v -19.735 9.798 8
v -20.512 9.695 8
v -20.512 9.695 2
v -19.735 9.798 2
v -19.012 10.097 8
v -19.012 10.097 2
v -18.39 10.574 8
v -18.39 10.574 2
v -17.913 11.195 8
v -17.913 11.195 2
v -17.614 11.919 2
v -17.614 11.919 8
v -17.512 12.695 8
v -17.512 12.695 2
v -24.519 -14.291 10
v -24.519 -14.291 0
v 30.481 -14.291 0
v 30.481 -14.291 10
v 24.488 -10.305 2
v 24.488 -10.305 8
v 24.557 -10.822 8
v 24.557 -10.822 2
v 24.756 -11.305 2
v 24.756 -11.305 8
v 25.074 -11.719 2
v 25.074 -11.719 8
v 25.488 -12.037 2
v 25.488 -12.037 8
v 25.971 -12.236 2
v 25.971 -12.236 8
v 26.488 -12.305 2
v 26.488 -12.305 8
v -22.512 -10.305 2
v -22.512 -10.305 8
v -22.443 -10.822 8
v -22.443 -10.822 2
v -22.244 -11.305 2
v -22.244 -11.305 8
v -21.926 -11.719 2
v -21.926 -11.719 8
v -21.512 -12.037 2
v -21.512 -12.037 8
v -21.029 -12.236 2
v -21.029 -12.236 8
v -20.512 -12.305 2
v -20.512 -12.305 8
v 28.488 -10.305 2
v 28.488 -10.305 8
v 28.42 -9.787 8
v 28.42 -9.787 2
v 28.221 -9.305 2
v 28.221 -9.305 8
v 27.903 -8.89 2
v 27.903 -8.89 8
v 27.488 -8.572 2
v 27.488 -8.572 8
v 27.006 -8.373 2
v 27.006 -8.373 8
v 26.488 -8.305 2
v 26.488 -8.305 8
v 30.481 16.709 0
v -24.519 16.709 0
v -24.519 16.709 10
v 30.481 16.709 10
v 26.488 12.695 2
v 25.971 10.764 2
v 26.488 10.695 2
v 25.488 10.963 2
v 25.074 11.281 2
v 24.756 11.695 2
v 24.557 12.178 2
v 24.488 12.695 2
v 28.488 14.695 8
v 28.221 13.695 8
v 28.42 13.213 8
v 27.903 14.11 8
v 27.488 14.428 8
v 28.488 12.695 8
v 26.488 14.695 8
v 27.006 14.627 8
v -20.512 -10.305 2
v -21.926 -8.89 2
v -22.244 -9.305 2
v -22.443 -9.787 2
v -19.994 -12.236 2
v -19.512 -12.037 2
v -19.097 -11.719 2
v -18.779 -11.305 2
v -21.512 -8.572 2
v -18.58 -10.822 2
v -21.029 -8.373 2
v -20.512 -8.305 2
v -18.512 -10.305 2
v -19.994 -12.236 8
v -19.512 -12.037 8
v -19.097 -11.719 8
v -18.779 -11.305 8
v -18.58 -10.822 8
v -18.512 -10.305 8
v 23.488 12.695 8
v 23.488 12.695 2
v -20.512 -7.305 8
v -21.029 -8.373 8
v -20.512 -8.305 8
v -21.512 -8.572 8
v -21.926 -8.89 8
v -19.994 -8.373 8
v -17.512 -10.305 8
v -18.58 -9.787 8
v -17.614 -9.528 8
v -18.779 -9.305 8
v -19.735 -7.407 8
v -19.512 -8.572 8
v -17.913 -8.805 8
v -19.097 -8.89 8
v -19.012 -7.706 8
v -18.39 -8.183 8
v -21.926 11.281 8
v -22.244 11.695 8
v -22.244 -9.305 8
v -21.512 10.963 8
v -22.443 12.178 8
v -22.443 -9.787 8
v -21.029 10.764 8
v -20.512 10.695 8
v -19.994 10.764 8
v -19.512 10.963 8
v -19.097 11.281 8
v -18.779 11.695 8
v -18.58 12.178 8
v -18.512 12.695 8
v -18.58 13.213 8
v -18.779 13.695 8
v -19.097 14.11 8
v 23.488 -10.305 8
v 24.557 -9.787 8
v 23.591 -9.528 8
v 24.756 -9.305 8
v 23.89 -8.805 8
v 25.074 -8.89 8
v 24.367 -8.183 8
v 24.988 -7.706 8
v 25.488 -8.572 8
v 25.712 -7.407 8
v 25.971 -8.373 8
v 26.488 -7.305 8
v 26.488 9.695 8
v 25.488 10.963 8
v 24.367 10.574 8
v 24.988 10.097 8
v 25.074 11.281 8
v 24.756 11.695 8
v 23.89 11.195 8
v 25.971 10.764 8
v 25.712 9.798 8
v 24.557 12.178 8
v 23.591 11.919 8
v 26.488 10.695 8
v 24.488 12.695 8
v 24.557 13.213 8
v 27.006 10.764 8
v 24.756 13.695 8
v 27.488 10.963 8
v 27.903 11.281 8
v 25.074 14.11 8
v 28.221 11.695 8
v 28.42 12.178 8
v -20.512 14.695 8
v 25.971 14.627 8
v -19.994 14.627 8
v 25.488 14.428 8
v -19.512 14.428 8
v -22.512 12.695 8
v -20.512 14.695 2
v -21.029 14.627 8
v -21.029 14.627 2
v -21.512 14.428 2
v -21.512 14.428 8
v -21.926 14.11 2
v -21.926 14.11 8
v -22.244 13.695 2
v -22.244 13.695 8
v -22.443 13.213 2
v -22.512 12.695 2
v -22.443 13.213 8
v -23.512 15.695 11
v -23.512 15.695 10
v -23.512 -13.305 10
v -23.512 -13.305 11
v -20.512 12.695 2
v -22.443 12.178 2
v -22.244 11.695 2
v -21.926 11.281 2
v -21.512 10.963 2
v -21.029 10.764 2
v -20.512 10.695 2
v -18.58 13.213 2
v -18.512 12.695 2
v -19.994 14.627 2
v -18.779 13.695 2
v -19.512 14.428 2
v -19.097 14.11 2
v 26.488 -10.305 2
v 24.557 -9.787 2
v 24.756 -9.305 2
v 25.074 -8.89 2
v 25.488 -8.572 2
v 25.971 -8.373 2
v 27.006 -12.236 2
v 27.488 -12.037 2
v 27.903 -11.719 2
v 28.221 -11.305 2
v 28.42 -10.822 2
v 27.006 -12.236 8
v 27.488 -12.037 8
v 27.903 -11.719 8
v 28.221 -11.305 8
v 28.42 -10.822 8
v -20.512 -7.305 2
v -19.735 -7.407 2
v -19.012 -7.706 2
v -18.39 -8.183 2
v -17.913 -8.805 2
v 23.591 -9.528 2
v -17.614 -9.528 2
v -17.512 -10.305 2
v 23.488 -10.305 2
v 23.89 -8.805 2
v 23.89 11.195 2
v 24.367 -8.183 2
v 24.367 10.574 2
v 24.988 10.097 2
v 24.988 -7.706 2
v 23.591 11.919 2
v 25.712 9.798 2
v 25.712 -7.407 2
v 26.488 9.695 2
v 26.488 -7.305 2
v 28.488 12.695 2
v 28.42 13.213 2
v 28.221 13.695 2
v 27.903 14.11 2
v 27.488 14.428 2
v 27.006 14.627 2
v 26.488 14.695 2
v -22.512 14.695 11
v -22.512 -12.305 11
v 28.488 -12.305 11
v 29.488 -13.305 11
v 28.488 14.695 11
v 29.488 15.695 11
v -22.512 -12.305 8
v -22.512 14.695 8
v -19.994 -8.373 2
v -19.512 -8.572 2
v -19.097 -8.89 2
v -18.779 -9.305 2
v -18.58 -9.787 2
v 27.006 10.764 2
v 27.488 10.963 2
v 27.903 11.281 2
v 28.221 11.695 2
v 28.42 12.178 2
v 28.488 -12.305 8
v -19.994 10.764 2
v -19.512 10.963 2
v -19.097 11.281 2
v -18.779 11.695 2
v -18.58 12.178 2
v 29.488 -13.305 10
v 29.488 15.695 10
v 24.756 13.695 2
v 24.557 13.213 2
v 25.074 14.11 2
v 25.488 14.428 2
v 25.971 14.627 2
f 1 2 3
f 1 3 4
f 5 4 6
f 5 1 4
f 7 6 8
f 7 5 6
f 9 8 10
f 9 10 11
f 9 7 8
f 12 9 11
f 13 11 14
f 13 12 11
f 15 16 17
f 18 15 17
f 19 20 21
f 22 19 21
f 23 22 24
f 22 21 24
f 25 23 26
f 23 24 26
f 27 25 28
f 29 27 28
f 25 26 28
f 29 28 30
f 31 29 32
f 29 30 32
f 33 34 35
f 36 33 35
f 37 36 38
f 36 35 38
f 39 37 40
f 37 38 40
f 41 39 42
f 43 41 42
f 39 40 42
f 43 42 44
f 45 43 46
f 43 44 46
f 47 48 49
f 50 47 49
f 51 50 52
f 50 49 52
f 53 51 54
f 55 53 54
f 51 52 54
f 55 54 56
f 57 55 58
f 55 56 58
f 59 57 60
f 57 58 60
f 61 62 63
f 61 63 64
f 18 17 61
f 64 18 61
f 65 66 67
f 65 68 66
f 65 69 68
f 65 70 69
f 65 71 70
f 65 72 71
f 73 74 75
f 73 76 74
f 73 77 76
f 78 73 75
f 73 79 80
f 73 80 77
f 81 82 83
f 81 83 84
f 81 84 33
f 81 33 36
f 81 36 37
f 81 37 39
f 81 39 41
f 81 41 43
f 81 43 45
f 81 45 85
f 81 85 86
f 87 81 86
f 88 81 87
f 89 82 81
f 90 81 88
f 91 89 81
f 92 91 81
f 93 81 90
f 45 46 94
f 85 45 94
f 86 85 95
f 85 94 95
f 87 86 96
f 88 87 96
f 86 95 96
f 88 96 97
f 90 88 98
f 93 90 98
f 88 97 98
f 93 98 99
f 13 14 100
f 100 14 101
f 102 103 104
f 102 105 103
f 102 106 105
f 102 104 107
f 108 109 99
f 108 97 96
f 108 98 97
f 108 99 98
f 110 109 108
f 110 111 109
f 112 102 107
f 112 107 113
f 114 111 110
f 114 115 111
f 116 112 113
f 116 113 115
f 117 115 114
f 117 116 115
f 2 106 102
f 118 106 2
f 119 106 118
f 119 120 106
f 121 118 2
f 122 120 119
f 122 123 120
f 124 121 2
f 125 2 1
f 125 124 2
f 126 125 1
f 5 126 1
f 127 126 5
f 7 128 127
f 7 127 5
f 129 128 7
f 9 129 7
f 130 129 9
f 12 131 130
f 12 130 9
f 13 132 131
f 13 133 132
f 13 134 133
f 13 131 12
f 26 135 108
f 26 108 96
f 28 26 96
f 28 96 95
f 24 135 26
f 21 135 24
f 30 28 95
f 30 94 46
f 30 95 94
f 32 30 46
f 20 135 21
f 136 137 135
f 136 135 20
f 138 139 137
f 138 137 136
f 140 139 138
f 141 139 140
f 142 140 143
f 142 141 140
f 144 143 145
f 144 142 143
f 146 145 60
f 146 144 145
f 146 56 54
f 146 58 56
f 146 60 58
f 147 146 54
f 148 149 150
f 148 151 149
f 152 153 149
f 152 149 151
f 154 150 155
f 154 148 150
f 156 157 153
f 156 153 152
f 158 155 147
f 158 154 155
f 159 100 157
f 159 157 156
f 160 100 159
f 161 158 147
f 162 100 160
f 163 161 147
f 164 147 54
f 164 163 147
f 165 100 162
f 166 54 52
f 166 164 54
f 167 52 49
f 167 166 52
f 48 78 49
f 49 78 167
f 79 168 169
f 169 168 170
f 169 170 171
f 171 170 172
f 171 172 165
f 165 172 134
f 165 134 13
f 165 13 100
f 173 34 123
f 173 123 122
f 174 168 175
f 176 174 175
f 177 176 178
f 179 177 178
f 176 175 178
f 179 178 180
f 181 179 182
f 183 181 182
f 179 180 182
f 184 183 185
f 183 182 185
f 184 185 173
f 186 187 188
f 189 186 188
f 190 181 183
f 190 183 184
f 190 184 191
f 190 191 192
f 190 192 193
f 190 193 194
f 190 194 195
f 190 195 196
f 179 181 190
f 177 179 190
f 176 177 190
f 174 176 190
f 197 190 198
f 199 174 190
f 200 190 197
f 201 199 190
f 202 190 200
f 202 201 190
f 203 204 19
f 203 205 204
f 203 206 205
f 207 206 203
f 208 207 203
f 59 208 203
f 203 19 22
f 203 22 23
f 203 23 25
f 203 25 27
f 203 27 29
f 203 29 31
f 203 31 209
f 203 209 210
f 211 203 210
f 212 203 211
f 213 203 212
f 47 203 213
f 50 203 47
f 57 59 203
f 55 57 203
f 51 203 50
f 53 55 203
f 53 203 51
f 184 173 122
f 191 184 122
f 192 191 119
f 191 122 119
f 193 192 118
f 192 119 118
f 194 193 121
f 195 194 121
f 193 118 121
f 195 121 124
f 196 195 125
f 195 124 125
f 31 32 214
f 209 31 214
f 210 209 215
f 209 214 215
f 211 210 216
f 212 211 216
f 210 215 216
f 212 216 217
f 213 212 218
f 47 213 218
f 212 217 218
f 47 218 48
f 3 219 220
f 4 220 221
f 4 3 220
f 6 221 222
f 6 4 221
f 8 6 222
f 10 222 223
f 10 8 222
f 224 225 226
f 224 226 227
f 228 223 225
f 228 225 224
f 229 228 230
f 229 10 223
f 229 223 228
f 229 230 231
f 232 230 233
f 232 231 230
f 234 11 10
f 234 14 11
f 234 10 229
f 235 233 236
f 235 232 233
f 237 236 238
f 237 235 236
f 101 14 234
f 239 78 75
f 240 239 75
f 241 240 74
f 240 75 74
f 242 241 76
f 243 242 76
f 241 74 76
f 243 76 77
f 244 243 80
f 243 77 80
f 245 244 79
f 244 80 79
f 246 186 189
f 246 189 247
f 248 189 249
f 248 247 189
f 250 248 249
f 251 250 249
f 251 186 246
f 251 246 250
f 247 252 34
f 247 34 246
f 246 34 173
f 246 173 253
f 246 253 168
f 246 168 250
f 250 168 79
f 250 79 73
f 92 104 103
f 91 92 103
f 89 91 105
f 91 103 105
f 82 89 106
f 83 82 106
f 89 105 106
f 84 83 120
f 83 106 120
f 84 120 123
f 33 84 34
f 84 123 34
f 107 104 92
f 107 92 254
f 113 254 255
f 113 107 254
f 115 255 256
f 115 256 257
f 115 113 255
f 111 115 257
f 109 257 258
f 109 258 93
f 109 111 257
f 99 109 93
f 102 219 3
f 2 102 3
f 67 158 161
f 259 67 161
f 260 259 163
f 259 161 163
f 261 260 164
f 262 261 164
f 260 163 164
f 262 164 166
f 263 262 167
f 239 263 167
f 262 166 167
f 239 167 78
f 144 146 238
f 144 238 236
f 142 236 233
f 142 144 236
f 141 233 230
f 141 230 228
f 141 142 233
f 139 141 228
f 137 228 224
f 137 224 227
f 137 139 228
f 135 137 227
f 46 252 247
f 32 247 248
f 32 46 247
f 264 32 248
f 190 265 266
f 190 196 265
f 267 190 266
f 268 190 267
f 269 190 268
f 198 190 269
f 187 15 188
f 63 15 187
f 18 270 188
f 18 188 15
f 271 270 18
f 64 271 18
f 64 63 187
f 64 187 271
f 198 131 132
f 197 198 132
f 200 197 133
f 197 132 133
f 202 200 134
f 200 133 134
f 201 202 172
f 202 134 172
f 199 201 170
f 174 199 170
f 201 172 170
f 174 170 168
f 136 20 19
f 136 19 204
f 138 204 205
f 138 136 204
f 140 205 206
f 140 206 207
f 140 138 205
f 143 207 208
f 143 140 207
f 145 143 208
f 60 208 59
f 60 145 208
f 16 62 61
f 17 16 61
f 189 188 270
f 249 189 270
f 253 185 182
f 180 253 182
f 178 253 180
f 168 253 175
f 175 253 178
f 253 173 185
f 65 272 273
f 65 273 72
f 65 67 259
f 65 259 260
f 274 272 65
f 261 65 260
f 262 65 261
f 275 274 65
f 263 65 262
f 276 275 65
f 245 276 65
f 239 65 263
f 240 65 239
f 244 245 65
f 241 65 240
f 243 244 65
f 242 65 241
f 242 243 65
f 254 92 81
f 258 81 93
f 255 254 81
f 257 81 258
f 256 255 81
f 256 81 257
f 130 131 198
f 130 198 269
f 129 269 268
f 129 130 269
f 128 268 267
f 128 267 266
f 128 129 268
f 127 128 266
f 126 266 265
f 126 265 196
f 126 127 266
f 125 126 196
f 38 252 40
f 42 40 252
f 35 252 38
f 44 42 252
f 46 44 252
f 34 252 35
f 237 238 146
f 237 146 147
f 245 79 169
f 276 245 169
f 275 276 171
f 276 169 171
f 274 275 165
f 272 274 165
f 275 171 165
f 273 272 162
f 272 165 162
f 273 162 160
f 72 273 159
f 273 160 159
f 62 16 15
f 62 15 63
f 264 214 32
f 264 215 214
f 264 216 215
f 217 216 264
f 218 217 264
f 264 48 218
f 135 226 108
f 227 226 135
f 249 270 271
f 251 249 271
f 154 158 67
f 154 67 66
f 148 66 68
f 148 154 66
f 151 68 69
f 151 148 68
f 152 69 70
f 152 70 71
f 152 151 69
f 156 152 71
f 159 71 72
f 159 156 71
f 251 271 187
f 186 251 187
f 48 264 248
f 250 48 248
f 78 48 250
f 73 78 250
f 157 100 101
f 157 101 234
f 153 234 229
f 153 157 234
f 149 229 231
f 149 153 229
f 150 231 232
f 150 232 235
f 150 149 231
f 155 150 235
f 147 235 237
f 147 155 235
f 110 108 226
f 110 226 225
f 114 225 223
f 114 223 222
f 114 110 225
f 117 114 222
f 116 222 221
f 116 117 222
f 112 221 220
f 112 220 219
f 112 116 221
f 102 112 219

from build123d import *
from build123d import SkipClean  # not in build123d's __all__

# Parameters (mm, degrees)
F0_W      = 55
F0_H      = 31
F2_DEPTH  = 10
F1_W      = 51
F1_H      = 27
F3_DEPTH  = 11
F4_DEPTH  = 8
F5_W      = 51
F5_H      = 2
F6_DEPTH  = 6
F7_W      = 2
F7_H      = 23
F8_DEPTH  = 6
F10_DEPTH = 6
F11_DEPTH = 6


with BuildPart() as f2:
    # F0 (on Top) → F2 (new body)
    with BuildSketch(Plane.XY):
        with Locations((2.9806493223, 1.209073022)):
            Rectangle(F0_W, F0_H)
    extrude(amount=F2_DEPTH)

    # F1 (on face) → F3 (join)
    with BuildSketch(Plane.XY):
        Polygon((-22.5115198195, 15.6954657286), (-23.5115198195, 15.6954657286), (-23.5115198195, -13.3045342714), (29.4884801805, -13.3045342714), (29.4884801805, 15.6954657286), align=None)
        with Locations((2.9884801805, 1.1954657286)):
            Rectangle(F1_W, F1_H, mode=Mode.SUBTRACT)
    extrude(amount=F3_DEPTH)

    # F4 (cut): a face of the model
    f4_faces = [f2.faces().sort_by_distance(p)[0] for p in [
        (2.9884801805, 1.1954657286, 10),
    ]]
    extrude(f4_faces, amount=-F4_DEPTH, mode=Mode.SUBTRACT)

    # F5 (on face) → F6 (join)
    with BuildSketch(Plane.XY.offset(2)):
        with Locations((2.9884801805, 13.6954657286)):
            Rectangle(F5_W, F5_H)
        with Locations((2.9884801805, -11.3045342714)):
            Rectangle(F5_W, F5_H)
    extrude(amount=F6_DEPTH)

    # F7 (on face) → F8 (join)
    with BuildSketch(Plane.XY.offset(2)):
        with Locations((27.4884801805, 1.1954657286)):
            Rectangle(F7_W, F7_H)
        with Locations((-21.5115198195, 1.1954657286)):
            Rectangle(F7_W, F7_H)
    extrude(amount=F8_DEPTH)

    # F9 (on face) → F10 (join)
    with BuildSketch(Plane.XY.offset(8)):
        with BuildLine():
            ThreePointArc((-20.5115198195, 9.6954657286), (-18.3901994759, 10.5741453851), (-17.5115198195, 12.6954657286))
            Line((-17.5115198195, 12.6954657286), (-18.5115198195, 12.6954657286))
            ThreePointArc((-18.5115198195, 12.6954657286), (-19.0973062571, 11.2812521663), (-20.5115198195, 10.6954657286))
            Line((-20.5115198195, 10.6954657286), (-20.5115198195, 9.6954657286))
        make_face()
        with BuildLine():
            ThreePointArc((-17.5115198195, -10.3045342714), (-18.3901994759, -8.1832139278), (-20.5115198195, -7.3045342714))
            Line((-20.5115198195, -7.3045342714), (-20.5115198195, -8.3045342714))
            ThreePointArc((-20.5115198195, -8.3045342714), (-19.0973062571, -8.890320709), (-18.5115198195, -10.3045342714))
            Line((-18.5115198195, -10.3045342714), (-17.5115198195, -10.3045342714))
        make_face()
        with BuildLine():
            Line((26.4884801805, -8.3045342714), (26.4884801805, -7.3045342714))
            ThreePointArc((26.4884801805, -7.3045342714), (24.3671598369, -8.1832139278), (23.4884801805, -10.3045342714))
            Line((23.4884801805, -10.3045342714), (24.4884801805, -10.3045342714))
            ThreePointArc((24.4884801805, -10.3045342714), (25.0742666181, -8.890320709), (26.4884801805, -8.3045342714))
        make_face()
        with BuildLine():
            Line((24.4884801805, 12.6954657286), (23.4884801805, 12.6954657286))
            ThreePointArc((23.4884801805, 12.6954657286), (24.3671598369, 10.5741453851), (26.4884801805, 9.6954657286))
            Line((26.4884801805, 9.6954657286), (26.4884801805, 10.6954657286))
            ThreePointArc((26.4884801805, 10.6954657286), (25.0742666181, 11.2812521663), (24.4884801805, 12.6954657286))
        make_face()
    extrude(amount=-F10_DEPTH)

    # F9 (on face) → F11 (cut)
    with BuildSketch(Plane.XY.offset(8)):
        with BuildLine():
            Line((-20.5115198195, 12.6954657286), (-18.5115198195, 12.6954657286))
            ThreePointArc((-18.5115198195, 12.6954657286), (-19.0973062461, 14.10967928), (-20.5115197883, 14.6954657286))
            ThreePointArc((-20.5115197883, 14.6954657286), (-21.9257333708, 14.1096793021), (-22.5115198195, 12.6954657286))
            ThreePointArc((-22.5115198195, 12.6954657286), (-21.9257333819, 11.2812521663), (-20.5115198195, 10.6954657286))
            Line((-20.5115198195, 10.6954657286), (-20.5115198195, 12.6954657286))
        make_face()
        with BuildLine():
            Line((-20.5115198195, -10.3045342714), (-20.5115198195, -8.3045342714))
            ThreePointArc((-20.5115198195, -8.3045342714), (-21.9257333819, -8.890320709), (-22.5115198195, -10.3045342714))
            ThreePointArc((-22.5115198195, -10.3045342714), (-21.9257333819, -11.7187478337), (-20.5115198195, -12.3045342714))
            ThreePointArc((-20.5115198195, -12.3045342714), (-19.0973062571, -11.7187478337), (-18.5115198195, -10.3045342714))
            Line((-18.5115198195, -10.3045342714), (-20.5115198195, -10.3045342714))
        make_face()
        with BuildLine():
            ThreePointArc((28.4884801805, -10.3045342714), (27.9026937429, -8.890320709), (26.4884801805, -8.3045342714))
            Line((26.4884801805, -8.3045342714), (26.4884801805, -10.3045342714))
            Line((26.4884801805, -10.3045342714), (24.4884801805, -10.3045342714))
            ThreePointArc((24.4884801805, -10.3045342714), (25.0742666181, -11.7187478337), (26.4884801805, -12.3045342714))
            ThreePointArc((26.4884801805, -12.3045342714), (27.9026937429, -11.7187478337), (28.4884801805, -10.3045342714))
        make_face()
        with BuildLine():
            ThreePointArc((26.4884801805, 14.6954657286), (25.0742666181, 14.109679291), (24.4884801805, 12.6954657286))
            Line((24.4884801805, 12.6954657286), (26.4884801805, 12.6954657286))
            Line((26.4884801805, 12.6954657286), (26.4884801805, 10.6954657286))
            ThreePointArc((26.4884801805, 10.6954657286), (27.9026937429, 11.2812521663), (28.4884801805, 12.6954657286))
            ThreePointArc((28.4884801805, 12.6954657286), (27.9026937429, 14.109679291), (26.4884801805, 14.6954657286))
        make_face()
    with SkipClean():  # cleaning this boolean's faces spoils the solid; the shape is the same uncleaned
        extrude(amount=-F11_DEPTH, mode=Mode.SUBTRACT)


solid = f2.part
